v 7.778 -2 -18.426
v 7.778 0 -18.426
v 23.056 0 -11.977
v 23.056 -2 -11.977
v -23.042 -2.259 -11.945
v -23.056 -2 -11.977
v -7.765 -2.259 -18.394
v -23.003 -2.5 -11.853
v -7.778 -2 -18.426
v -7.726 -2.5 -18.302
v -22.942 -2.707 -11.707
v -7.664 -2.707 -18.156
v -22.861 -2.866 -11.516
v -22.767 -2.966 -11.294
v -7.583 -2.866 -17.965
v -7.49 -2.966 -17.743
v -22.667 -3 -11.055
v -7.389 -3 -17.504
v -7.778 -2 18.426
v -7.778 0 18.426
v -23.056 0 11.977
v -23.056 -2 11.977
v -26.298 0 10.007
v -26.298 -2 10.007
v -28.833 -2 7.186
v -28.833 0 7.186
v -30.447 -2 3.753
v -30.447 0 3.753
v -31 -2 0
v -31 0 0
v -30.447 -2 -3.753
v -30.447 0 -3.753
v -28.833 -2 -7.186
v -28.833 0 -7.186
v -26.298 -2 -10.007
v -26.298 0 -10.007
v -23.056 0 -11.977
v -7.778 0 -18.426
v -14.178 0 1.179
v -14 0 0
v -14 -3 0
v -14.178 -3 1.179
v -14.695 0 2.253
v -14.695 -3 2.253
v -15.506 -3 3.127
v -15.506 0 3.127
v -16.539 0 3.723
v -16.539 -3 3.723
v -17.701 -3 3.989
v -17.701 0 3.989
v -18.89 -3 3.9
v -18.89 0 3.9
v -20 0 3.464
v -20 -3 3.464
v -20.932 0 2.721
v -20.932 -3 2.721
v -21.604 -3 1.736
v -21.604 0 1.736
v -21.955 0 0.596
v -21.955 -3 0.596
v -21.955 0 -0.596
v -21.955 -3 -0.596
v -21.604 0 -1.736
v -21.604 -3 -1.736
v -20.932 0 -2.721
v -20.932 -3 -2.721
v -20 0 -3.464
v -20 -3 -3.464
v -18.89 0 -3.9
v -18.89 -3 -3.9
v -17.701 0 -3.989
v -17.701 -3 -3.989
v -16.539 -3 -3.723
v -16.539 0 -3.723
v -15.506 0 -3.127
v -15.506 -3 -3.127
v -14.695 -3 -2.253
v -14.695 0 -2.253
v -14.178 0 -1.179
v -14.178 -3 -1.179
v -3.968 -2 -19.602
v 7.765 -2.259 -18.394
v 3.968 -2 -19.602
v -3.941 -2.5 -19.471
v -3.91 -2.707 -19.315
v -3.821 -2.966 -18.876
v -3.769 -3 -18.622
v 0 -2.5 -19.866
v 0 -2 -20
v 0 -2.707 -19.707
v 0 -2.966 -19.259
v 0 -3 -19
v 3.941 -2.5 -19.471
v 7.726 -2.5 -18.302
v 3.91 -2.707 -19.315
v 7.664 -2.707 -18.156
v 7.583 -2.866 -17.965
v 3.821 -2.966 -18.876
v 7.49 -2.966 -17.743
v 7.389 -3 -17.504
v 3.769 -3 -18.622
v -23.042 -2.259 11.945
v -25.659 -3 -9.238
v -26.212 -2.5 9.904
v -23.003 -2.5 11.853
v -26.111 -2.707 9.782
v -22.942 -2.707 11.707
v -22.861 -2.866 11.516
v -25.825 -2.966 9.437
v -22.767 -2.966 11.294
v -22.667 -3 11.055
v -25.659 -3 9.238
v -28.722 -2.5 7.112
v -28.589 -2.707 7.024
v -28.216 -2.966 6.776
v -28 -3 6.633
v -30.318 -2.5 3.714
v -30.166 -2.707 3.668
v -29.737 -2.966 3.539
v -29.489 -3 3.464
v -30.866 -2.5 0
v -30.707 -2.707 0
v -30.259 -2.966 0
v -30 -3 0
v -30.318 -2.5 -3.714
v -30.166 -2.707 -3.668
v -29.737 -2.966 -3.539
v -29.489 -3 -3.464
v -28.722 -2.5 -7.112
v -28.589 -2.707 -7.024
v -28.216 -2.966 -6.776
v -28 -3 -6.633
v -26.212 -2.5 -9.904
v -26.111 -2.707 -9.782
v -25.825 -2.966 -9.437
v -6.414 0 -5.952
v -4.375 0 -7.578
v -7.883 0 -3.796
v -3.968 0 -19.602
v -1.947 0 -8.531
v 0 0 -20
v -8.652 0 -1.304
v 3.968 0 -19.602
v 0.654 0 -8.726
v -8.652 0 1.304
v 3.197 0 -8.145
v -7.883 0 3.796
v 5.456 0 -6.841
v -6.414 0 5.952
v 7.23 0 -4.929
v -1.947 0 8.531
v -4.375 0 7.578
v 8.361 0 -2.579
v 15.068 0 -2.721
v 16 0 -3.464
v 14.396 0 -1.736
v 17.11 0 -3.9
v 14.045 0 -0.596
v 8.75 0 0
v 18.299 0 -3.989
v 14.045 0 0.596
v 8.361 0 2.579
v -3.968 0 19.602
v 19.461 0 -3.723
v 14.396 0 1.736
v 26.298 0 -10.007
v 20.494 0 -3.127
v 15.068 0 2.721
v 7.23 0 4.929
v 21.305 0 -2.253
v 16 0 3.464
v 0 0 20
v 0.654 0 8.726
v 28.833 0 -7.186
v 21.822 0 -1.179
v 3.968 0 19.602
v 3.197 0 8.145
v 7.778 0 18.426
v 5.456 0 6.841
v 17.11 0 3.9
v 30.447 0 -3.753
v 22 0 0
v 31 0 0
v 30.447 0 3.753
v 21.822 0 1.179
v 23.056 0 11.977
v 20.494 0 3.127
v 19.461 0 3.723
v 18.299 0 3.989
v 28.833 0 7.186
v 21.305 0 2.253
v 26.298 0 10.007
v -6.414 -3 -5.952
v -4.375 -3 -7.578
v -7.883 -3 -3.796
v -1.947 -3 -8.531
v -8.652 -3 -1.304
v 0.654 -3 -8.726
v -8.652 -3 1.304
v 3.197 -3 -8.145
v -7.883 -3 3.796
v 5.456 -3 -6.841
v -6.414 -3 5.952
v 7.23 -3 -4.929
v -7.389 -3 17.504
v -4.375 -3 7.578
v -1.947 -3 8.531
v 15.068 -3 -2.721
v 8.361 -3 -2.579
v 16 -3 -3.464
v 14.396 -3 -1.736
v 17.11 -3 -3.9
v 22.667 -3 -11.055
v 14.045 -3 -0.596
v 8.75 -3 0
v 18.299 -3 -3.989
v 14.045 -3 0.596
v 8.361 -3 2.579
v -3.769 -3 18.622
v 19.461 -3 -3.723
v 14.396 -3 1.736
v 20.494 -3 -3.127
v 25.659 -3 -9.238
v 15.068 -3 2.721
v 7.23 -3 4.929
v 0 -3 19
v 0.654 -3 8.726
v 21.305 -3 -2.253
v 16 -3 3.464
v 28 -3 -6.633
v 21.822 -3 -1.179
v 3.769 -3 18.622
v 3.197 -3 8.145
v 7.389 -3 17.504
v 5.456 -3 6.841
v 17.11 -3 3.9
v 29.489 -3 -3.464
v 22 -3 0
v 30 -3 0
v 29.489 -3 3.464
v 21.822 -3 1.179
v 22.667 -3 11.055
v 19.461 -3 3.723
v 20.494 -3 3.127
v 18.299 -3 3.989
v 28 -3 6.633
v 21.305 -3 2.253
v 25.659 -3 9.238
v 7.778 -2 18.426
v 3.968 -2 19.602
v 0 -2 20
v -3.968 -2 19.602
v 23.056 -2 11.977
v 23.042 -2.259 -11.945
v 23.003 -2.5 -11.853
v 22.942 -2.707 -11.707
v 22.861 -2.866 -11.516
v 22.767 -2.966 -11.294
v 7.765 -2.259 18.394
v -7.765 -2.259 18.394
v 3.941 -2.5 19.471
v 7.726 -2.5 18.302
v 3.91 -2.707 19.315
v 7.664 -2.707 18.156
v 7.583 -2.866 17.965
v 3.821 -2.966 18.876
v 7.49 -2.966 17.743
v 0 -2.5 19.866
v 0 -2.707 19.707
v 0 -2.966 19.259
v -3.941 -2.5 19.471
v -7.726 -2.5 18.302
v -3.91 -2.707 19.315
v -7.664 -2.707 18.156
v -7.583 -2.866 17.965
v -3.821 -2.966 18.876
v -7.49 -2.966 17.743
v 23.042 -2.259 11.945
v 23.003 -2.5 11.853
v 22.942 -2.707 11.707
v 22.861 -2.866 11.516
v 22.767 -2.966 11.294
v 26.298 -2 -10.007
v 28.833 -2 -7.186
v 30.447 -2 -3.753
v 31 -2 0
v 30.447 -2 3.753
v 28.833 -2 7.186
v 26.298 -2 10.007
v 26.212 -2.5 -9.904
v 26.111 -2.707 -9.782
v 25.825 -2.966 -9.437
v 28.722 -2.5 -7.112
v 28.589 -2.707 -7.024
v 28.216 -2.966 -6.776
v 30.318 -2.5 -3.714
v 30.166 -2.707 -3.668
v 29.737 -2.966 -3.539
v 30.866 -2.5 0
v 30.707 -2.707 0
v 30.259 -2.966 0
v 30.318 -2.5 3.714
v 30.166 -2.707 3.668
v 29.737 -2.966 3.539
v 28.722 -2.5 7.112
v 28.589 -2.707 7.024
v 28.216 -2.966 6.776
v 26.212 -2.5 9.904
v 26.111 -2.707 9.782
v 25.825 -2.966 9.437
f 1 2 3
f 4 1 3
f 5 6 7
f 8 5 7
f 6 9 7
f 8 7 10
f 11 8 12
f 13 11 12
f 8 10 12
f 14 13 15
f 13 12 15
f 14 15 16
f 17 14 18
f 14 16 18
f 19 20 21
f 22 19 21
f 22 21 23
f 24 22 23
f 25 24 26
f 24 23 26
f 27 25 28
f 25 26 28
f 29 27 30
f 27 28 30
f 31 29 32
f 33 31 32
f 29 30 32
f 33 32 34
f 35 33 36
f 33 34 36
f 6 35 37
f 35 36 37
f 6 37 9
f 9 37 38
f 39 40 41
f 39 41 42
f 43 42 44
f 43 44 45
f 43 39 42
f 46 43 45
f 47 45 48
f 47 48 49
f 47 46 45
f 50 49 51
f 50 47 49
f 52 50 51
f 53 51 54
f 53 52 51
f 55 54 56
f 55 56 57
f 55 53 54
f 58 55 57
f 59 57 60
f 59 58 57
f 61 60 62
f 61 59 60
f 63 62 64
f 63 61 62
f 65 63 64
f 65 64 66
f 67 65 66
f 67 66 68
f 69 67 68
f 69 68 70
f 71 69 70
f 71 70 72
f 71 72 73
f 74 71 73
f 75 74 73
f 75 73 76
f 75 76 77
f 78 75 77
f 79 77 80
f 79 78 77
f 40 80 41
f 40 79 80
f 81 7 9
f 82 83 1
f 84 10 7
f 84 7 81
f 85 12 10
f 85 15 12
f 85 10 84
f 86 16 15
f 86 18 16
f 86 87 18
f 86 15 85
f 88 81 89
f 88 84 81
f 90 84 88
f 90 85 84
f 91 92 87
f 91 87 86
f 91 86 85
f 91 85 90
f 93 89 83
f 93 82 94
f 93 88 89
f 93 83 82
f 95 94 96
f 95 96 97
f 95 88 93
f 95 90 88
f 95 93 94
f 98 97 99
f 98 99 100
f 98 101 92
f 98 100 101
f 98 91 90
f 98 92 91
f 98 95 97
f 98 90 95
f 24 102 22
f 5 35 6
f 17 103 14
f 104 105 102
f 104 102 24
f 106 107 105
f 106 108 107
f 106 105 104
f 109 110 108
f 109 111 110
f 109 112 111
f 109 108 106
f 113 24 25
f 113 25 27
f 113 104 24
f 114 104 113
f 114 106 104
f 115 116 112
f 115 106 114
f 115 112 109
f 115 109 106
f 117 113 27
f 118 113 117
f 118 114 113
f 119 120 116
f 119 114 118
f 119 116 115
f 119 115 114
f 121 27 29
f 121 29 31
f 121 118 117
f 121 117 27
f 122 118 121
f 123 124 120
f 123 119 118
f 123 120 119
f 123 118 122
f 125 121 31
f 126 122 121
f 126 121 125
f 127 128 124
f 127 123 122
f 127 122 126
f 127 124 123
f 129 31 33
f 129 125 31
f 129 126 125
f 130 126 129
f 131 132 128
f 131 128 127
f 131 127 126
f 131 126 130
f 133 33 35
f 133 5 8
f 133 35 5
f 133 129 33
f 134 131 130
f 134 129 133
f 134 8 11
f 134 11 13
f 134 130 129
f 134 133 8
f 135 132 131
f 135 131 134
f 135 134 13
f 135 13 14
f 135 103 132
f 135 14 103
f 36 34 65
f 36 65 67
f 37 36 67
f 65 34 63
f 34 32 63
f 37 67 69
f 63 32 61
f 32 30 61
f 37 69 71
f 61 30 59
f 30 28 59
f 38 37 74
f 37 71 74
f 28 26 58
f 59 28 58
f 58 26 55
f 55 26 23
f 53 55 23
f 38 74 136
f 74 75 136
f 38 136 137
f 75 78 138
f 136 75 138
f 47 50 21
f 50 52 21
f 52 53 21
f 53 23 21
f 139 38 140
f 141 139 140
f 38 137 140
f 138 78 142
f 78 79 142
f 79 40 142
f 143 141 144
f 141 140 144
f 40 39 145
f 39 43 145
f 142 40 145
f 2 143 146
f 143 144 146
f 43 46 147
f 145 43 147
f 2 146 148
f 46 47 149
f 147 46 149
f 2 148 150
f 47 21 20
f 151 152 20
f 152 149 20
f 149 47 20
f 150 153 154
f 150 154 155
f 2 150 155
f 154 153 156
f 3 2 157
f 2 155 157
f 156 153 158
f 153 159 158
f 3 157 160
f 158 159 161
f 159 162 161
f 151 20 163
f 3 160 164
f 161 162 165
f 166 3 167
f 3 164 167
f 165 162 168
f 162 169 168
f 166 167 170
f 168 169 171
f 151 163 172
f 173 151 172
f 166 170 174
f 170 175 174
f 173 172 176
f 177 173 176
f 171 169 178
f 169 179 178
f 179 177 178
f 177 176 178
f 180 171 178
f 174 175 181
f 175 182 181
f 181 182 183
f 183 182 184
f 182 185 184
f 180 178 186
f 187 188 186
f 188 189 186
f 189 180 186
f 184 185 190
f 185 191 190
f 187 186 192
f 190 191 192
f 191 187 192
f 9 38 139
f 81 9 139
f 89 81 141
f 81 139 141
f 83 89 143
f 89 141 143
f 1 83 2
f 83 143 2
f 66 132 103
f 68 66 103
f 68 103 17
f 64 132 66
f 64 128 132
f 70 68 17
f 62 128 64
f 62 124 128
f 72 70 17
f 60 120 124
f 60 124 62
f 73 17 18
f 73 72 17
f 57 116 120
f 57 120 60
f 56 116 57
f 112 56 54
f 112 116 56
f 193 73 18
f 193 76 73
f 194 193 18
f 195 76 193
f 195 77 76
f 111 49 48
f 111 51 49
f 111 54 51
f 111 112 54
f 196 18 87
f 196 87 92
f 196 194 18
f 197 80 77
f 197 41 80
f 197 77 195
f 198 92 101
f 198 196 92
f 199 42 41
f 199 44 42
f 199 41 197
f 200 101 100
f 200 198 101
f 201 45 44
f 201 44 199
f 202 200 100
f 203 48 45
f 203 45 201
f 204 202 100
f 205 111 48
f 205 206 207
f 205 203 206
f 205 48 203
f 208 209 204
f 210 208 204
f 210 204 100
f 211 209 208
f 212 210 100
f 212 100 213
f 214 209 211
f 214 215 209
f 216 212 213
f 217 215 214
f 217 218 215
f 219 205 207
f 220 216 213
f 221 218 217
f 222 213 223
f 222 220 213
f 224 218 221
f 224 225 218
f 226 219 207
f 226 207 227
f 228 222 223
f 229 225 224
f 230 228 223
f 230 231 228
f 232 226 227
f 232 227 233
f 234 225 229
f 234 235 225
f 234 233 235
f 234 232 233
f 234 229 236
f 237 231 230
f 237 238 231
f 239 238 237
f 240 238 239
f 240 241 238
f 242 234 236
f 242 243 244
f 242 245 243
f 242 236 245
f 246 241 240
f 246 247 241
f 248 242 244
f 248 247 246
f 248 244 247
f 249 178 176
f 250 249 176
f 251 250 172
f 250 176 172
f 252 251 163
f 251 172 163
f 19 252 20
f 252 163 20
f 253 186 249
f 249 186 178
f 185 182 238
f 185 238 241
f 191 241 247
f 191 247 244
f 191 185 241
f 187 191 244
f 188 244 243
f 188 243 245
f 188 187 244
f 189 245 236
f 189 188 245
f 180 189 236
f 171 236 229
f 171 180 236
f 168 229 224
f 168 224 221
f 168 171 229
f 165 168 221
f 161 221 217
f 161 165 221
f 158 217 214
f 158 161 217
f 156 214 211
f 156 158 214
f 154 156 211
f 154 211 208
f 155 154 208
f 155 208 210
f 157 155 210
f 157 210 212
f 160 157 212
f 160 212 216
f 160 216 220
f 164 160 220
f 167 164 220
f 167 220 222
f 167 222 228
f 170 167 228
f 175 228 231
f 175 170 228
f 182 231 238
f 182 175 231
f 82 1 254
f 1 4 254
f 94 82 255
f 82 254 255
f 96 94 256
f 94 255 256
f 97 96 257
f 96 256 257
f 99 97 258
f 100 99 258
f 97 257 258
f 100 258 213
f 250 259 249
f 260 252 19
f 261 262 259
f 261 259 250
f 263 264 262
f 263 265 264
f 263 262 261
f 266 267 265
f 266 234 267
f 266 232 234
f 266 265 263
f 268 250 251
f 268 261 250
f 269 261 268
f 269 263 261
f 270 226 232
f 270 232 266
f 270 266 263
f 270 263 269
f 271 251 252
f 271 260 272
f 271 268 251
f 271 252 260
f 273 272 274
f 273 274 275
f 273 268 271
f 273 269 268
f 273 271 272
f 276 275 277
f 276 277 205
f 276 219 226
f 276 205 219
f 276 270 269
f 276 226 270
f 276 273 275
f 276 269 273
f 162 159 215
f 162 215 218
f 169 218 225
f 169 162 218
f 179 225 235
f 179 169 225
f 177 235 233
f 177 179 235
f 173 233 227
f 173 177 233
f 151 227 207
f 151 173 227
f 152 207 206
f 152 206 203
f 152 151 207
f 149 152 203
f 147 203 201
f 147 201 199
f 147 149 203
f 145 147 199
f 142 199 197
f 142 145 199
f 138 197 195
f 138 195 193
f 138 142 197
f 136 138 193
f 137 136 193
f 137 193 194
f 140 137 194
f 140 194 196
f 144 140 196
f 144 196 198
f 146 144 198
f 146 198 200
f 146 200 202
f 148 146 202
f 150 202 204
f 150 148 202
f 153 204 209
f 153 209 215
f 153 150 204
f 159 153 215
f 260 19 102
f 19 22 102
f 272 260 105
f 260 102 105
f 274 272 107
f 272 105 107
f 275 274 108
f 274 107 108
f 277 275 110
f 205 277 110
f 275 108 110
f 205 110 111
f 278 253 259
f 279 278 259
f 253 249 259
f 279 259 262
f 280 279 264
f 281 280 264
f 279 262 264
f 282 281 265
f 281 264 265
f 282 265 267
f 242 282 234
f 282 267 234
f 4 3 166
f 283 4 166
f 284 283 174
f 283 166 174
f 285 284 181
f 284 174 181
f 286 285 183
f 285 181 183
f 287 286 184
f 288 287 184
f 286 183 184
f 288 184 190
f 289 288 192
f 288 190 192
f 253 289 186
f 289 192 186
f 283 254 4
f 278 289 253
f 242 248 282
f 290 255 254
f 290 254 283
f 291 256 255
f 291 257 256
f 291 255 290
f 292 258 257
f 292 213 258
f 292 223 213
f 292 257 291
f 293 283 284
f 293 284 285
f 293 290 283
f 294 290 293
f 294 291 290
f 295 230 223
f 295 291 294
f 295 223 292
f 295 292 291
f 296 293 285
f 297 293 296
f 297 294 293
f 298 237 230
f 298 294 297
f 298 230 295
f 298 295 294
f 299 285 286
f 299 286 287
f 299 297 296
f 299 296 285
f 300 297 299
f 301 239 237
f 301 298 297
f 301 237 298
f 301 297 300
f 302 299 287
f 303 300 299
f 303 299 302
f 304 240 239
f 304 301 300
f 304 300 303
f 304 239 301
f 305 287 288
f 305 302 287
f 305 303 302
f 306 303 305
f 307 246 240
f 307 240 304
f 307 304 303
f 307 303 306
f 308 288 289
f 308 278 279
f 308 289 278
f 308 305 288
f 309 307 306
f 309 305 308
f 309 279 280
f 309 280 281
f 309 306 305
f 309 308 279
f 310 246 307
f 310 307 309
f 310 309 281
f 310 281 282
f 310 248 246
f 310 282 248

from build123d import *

# Parameters (mm, degrees)
F0_R     = 4
F0_R_2   = 8.75
F1_DEPTH = 3
F2_R     = 1


with BuildPart() as f1:
    # F0 (on Front) → F1 (new body)
    with BuildSketch(Plane.XZ):
        with BuildLine():
            Line((-23.055556, -11.976701), (-7.777778, -18.425693))
            ThreePointArc((-7.777778, -18.425693), (0, -20), (7.777778, -18.425693))
            Line((7.777778, -18.425693), (23.055556, -11.976701))
            ThreePointArc((23.055556, -11.976701), (31, 0), (23.055556, 11.976701))
            Line((23.055556, 11.976701), (7.777778, 18.425693))
            ThreePointArc((7.777778, 18.425693), (0, 20), (-7.777778, 18.425693))
            Line((-7.777778, 18.425693), (-23.055556, 11.976701))
            ThreePointArc((-23.055556, 11.976701), (-31, 0), (-23.055556, -11.976701))
        make_face()
        with Locations((-18, 0)):
            Circle(F0_R, mode=Mode.SUBTRACT)
        Circle(F0_R_2, mode=Mode.SUBTRACT)
        with Locations((18, 0)):
            Circle(F0_R, mode=Mode.SUBTRACT)
    extrude(amount=F1_DEPTH)

    # F2
    f2_edges = [f1.edges().sort_by_distance(p)[0] for p in [
        (15.416667, -3, 15.201197),
    ]]
    fillet(f2_edges, radius=F2_R)


solid = f1.part
